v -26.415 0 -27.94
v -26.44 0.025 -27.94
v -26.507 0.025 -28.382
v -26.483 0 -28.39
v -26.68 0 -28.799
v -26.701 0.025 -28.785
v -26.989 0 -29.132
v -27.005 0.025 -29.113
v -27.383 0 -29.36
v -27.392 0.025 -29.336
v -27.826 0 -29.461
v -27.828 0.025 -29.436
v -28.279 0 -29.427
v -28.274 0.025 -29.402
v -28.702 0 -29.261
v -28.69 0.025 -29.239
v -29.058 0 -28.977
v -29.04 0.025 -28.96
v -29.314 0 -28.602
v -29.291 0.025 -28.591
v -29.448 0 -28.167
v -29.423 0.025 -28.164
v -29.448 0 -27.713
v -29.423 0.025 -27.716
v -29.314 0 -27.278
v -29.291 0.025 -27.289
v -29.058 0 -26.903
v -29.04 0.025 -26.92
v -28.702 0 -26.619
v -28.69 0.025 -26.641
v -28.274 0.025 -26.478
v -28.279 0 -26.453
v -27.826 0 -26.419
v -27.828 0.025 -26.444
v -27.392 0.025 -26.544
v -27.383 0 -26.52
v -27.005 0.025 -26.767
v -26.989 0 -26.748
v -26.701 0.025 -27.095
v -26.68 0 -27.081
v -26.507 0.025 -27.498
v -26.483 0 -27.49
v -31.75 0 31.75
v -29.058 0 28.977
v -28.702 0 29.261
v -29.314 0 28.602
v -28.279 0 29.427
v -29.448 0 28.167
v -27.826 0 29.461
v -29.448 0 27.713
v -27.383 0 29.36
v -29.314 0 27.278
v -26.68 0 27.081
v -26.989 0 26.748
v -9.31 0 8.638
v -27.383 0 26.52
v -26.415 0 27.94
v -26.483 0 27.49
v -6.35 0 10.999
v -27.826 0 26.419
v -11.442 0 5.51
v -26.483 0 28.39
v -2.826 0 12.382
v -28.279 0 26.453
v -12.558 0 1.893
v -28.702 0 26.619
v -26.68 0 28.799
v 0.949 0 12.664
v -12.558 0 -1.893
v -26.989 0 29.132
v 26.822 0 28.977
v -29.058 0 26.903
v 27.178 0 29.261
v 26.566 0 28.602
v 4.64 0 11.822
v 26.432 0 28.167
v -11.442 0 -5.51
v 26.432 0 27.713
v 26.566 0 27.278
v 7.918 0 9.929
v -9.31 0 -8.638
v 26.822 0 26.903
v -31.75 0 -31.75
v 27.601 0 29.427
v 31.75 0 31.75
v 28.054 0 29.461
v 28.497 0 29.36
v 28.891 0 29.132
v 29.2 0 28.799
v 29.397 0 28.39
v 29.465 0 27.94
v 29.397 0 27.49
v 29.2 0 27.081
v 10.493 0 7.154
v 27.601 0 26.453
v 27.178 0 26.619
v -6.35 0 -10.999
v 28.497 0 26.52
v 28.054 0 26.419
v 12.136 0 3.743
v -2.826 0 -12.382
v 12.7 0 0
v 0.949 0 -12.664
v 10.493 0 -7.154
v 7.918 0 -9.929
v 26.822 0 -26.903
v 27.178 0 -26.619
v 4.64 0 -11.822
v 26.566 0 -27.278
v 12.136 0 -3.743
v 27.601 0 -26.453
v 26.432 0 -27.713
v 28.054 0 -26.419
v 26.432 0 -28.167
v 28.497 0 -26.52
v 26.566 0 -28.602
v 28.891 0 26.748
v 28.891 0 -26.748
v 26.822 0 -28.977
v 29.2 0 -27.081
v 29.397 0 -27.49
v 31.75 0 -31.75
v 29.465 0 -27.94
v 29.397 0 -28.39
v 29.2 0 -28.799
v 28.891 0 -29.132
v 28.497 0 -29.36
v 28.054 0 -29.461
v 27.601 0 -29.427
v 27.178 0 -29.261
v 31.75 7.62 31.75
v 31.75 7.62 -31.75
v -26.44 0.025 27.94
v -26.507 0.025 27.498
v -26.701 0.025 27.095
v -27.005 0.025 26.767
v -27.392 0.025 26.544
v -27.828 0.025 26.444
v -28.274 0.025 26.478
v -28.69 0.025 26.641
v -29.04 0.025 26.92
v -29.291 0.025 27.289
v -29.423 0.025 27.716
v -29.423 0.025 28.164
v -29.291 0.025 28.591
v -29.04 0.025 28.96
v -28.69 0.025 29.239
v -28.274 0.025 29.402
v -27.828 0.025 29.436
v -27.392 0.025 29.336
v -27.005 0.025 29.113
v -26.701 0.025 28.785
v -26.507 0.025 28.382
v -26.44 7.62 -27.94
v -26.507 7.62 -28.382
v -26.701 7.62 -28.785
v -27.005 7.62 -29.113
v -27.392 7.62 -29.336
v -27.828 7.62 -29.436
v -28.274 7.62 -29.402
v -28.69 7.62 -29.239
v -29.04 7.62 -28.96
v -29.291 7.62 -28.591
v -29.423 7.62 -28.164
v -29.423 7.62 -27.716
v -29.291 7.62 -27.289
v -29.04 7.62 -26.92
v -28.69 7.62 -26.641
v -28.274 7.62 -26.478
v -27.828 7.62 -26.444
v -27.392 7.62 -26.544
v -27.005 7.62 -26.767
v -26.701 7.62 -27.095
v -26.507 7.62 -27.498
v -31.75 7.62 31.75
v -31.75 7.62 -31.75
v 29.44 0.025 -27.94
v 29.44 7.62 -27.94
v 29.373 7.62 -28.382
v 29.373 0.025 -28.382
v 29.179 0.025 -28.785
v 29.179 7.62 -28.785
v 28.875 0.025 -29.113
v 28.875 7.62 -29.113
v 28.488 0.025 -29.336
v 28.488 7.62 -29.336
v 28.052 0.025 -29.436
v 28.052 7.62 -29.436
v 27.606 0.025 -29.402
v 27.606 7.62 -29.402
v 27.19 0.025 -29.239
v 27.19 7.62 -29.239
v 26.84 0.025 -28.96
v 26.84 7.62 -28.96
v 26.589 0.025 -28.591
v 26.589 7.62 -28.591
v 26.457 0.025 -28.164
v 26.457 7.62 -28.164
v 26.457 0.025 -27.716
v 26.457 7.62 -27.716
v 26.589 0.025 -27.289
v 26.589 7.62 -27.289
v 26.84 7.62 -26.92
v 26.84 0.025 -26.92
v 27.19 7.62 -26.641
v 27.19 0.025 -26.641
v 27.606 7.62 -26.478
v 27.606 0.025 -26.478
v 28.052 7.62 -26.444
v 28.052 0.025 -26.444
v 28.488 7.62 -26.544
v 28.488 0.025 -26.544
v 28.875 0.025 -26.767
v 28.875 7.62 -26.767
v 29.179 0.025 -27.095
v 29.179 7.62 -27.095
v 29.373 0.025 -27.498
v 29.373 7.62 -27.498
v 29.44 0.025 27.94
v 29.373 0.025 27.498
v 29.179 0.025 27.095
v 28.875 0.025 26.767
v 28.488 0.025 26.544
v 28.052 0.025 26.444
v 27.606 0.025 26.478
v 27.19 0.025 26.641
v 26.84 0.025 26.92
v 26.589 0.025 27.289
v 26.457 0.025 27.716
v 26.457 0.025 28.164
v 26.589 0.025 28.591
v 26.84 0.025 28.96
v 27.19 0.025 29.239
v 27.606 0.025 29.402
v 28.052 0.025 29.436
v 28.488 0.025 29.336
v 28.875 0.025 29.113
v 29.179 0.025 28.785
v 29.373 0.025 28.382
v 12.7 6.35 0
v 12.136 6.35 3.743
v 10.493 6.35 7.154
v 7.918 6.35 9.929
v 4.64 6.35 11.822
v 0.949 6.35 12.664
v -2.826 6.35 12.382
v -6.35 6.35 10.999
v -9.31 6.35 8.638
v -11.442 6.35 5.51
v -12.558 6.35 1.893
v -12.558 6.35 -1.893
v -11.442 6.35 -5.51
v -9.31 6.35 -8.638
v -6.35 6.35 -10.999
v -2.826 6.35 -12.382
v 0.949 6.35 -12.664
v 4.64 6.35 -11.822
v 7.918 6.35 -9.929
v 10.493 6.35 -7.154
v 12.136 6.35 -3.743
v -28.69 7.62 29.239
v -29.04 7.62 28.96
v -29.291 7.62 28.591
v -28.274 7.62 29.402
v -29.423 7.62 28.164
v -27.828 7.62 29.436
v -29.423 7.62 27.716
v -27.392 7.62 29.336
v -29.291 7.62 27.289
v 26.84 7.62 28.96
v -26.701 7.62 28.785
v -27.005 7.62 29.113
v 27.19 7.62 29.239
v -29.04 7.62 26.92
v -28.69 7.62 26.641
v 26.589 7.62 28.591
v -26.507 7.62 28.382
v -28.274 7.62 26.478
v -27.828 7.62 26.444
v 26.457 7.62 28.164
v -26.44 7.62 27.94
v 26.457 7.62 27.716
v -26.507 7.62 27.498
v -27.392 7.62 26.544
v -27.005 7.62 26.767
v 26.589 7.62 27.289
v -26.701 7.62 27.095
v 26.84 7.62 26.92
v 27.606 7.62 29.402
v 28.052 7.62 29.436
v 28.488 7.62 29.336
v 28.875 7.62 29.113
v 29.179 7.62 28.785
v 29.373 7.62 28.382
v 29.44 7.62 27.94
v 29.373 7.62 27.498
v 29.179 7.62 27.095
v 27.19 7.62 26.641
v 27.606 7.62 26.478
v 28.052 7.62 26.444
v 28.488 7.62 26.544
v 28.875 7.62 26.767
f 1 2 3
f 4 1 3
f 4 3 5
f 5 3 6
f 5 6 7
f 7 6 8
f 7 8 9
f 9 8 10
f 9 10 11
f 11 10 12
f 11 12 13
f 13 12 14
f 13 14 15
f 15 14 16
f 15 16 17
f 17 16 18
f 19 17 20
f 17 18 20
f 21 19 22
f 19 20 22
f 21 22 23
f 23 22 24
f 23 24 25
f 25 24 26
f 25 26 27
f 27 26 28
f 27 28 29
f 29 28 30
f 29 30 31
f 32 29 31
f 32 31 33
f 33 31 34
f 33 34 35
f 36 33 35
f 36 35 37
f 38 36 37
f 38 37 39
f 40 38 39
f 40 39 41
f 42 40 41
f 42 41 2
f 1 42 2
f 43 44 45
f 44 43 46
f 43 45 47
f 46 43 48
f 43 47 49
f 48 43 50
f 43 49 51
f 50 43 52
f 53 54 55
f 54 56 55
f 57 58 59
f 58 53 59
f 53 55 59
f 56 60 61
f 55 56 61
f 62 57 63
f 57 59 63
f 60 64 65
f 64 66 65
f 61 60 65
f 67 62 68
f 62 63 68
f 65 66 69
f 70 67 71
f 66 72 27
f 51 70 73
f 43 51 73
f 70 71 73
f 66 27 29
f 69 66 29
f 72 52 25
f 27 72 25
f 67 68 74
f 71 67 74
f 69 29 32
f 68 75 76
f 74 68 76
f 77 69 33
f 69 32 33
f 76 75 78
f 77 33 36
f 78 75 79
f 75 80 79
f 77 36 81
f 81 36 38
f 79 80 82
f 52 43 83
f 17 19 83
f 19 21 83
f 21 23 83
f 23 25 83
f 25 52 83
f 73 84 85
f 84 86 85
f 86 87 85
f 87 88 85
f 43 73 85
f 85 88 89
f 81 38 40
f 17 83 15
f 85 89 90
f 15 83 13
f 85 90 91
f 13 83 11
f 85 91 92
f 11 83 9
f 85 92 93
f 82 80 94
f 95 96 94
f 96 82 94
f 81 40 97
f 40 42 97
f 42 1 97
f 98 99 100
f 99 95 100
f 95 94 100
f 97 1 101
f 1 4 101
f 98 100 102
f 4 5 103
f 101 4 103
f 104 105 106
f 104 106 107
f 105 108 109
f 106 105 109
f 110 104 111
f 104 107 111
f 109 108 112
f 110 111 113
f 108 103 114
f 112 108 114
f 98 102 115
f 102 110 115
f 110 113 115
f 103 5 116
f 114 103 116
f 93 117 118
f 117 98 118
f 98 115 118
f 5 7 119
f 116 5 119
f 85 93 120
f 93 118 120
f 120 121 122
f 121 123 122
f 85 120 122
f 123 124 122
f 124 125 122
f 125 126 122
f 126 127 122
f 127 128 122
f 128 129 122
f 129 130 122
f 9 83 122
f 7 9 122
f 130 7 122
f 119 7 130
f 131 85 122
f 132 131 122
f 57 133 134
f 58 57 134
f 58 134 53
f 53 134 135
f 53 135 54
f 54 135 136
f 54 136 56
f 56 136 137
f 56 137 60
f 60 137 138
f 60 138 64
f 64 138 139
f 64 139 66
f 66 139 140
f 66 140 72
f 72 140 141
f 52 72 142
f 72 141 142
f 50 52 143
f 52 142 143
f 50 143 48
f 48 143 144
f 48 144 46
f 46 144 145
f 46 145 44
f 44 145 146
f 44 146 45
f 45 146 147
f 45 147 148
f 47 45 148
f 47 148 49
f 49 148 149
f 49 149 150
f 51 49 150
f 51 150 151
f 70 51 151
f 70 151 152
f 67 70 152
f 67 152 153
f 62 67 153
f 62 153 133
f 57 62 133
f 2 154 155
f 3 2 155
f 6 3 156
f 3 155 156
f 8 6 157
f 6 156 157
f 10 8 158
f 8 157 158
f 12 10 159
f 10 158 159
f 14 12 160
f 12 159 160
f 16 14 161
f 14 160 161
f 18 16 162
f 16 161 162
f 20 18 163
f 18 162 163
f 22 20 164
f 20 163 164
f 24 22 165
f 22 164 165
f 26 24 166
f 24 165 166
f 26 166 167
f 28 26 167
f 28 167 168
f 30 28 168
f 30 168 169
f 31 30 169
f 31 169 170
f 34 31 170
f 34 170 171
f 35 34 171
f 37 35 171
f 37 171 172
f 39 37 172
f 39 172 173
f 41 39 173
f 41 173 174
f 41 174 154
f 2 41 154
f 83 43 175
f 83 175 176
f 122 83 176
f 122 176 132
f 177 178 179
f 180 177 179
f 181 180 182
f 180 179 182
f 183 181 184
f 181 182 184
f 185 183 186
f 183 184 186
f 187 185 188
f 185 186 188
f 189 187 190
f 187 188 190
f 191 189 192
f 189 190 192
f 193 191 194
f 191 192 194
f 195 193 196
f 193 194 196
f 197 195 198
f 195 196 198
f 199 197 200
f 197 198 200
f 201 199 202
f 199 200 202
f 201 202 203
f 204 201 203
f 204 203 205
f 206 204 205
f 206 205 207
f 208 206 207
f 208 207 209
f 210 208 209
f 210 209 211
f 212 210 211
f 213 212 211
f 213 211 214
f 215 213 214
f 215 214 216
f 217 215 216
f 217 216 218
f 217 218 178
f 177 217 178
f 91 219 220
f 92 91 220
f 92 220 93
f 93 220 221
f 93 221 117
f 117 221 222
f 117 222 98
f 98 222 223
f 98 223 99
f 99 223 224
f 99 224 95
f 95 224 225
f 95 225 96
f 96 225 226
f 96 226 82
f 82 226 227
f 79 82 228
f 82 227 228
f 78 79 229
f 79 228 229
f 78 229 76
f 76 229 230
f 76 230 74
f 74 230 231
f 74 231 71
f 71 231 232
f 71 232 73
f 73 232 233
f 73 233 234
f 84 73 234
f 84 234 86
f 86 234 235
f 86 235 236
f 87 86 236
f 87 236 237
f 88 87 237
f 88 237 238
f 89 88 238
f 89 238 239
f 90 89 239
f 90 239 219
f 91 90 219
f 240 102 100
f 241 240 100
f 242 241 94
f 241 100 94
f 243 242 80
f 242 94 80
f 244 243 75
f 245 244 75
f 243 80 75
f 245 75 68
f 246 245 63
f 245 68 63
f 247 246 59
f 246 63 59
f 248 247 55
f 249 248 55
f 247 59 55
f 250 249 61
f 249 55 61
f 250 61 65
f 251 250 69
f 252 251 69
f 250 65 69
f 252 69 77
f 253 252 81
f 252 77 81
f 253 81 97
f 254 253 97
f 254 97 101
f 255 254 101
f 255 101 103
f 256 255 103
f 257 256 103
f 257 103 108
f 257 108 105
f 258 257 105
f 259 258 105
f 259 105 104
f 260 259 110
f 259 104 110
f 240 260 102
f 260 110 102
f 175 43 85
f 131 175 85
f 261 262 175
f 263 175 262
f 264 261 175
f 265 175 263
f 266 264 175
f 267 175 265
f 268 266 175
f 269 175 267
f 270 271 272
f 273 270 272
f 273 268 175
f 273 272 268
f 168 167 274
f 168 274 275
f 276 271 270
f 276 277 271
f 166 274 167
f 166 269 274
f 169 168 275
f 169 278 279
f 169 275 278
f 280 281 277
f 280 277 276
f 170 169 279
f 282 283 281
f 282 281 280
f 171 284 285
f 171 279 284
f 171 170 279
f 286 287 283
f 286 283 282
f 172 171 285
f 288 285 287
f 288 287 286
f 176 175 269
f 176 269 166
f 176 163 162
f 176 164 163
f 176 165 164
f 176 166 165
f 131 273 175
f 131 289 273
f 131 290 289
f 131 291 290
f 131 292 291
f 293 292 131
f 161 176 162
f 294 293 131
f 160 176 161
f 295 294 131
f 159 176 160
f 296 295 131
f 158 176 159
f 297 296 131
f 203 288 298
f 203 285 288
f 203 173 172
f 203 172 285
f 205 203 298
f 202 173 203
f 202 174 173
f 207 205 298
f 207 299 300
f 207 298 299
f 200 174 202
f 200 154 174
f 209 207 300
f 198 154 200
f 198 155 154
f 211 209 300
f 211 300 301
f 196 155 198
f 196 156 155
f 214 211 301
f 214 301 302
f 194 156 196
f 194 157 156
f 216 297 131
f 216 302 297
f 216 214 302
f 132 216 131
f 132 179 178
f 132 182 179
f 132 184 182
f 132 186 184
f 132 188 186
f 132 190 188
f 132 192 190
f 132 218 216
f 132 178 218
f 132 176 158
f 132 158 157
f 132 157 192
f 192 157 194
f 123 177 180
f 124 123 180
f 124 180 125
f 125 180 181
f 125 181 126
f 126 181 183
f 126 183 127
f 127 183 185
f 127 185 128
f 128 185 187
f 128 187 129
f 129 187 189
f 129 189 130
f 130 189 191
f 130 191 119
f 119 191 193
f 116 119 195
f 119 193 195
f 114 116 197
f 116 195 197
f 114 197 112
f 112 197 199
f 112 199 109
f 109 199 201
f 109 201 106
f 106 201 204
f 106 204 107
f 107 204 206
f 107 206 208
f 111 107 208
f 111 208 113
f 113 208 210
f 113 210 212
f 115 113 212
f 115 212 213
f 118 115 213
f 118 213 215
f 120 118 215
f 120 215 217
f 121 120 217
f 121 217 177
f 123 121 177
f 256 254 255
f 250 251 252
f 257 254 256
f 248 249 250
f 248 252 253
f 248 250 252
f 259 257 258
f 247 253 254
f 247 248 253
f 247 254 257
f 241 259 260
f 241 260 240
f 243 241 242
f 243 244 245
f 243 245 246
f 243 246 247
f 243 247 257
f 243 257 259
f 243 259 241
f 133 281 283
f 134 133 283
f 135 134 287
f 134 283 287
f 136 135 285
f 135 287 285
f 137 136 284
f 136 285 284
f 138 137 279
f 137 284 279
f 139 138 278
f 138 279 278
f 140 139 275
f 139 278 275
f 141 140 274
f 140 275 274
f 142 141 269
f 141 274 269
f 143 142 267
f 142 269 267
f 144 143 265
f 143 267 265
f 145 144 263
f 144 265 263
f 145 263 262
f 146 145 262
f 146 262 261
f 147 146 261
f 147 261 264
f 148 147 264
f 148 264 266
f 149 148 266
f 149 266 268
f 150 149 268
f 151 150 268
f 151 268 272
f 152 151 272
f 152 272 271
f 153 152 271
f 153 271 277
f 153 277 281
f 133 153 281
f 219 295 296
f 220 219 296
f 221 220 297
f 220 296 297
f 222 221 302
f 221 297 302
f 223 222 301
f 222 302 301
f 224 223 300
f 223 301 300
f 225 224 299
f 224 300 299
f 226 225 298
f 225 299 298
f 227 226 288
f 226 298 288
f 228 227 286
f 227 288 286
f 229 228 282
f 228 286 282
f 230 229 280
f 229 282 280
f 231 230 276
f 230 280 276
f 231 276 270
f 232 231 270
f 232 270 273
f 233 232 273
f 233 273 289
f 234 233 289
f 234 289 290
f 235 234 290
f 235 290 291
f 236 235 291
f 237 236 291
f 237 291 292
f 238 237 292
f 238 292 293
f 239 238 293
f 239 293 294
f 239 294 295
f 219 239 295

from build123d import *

# Parameters (mm, degrees)
SKETCH1_W                       = 63.5
SKETCH1_H                       = 63.5
BOSS_EXTRUDE1_DEPTH             = 7.62
F_3_0MM_DOWEL_HOLE1_D           = 3
F_3_0MM_DOWEL_HOLE1_DEPTH       = 7.62
F_3_0MM_DOWEL_HOLE1_CSINK_D     = 3.05
F_3_0MM_DOWEL_HOLE1_CSINK_ANGLE = 90
LPATTERN1_COUNT                 = 2
LPATTERN1_PITCH                 = 55.88
LPATTERN1_COUNT_DIR2            = 2
LPATTERN1_PITCH_DIR2            = 55.88
SKETCH6_R                       = 12.7
CUT_EXTRUDE1_DEPTH              = 6.35


with BuildPart() as part:
    # Sketch1 → Boss-Extrude1 (new body)
    with BuildSketch(Plane(origin=(0, 0, 0), x_dir=(1, 0, 0), z_dir=(0, 1, 0))):
        Rectangle(SKETCH1_W, SKETCH1_H)
    extrude(amount=BOSS_EXTRUDE1_DEPTH)

    # Ø3.0mm Dowel Hole1
    with Locations(Plane(origin=(0, 0, 0), x_dir=(-1, 0, 0), z_dir=(0, -1, 0))):
        with Locations((-27.94, -27.94)):
            f_3_0mm_dowel_hole1 = CounterSinkHole(F_3_0MM_DOWEL_HOLE1_D / 2, F_3_0MM_DOWEL_HOLE1_CSINK_D / 2, depth=F_3_0MM_DOWEL_HOLE1_DEPTH, counter_sink_angle=F_3_0MM_DOWEL_HOLE1_CSINK_ANGLE)

    # LPattern1: 3.0mm Dowel Hole1 2 × 2
    with Locations(*[(-j * LPATTERN1_PITCH_DIR2, 0, -i * LPATTERN1_PITCH) for i in range(LPATTERN1_COUNT) for j in range(LPATTERN1_COUNT_DIR2) if (i, j) != (0, 0)]):
        add(f_3_0mm_dowel_hole1, mode=Mode.SUBTRACT)

    # Sketch6 → Cut-Extrude1 (cut)
    with BuildSketch(Plane.XZ):
        Circle(SKETCH6_R)
    extrude(amount=-CUT_EXTRUDE1_DEPTH, mode=Mode.SUBTRACT)


solid = part.part
